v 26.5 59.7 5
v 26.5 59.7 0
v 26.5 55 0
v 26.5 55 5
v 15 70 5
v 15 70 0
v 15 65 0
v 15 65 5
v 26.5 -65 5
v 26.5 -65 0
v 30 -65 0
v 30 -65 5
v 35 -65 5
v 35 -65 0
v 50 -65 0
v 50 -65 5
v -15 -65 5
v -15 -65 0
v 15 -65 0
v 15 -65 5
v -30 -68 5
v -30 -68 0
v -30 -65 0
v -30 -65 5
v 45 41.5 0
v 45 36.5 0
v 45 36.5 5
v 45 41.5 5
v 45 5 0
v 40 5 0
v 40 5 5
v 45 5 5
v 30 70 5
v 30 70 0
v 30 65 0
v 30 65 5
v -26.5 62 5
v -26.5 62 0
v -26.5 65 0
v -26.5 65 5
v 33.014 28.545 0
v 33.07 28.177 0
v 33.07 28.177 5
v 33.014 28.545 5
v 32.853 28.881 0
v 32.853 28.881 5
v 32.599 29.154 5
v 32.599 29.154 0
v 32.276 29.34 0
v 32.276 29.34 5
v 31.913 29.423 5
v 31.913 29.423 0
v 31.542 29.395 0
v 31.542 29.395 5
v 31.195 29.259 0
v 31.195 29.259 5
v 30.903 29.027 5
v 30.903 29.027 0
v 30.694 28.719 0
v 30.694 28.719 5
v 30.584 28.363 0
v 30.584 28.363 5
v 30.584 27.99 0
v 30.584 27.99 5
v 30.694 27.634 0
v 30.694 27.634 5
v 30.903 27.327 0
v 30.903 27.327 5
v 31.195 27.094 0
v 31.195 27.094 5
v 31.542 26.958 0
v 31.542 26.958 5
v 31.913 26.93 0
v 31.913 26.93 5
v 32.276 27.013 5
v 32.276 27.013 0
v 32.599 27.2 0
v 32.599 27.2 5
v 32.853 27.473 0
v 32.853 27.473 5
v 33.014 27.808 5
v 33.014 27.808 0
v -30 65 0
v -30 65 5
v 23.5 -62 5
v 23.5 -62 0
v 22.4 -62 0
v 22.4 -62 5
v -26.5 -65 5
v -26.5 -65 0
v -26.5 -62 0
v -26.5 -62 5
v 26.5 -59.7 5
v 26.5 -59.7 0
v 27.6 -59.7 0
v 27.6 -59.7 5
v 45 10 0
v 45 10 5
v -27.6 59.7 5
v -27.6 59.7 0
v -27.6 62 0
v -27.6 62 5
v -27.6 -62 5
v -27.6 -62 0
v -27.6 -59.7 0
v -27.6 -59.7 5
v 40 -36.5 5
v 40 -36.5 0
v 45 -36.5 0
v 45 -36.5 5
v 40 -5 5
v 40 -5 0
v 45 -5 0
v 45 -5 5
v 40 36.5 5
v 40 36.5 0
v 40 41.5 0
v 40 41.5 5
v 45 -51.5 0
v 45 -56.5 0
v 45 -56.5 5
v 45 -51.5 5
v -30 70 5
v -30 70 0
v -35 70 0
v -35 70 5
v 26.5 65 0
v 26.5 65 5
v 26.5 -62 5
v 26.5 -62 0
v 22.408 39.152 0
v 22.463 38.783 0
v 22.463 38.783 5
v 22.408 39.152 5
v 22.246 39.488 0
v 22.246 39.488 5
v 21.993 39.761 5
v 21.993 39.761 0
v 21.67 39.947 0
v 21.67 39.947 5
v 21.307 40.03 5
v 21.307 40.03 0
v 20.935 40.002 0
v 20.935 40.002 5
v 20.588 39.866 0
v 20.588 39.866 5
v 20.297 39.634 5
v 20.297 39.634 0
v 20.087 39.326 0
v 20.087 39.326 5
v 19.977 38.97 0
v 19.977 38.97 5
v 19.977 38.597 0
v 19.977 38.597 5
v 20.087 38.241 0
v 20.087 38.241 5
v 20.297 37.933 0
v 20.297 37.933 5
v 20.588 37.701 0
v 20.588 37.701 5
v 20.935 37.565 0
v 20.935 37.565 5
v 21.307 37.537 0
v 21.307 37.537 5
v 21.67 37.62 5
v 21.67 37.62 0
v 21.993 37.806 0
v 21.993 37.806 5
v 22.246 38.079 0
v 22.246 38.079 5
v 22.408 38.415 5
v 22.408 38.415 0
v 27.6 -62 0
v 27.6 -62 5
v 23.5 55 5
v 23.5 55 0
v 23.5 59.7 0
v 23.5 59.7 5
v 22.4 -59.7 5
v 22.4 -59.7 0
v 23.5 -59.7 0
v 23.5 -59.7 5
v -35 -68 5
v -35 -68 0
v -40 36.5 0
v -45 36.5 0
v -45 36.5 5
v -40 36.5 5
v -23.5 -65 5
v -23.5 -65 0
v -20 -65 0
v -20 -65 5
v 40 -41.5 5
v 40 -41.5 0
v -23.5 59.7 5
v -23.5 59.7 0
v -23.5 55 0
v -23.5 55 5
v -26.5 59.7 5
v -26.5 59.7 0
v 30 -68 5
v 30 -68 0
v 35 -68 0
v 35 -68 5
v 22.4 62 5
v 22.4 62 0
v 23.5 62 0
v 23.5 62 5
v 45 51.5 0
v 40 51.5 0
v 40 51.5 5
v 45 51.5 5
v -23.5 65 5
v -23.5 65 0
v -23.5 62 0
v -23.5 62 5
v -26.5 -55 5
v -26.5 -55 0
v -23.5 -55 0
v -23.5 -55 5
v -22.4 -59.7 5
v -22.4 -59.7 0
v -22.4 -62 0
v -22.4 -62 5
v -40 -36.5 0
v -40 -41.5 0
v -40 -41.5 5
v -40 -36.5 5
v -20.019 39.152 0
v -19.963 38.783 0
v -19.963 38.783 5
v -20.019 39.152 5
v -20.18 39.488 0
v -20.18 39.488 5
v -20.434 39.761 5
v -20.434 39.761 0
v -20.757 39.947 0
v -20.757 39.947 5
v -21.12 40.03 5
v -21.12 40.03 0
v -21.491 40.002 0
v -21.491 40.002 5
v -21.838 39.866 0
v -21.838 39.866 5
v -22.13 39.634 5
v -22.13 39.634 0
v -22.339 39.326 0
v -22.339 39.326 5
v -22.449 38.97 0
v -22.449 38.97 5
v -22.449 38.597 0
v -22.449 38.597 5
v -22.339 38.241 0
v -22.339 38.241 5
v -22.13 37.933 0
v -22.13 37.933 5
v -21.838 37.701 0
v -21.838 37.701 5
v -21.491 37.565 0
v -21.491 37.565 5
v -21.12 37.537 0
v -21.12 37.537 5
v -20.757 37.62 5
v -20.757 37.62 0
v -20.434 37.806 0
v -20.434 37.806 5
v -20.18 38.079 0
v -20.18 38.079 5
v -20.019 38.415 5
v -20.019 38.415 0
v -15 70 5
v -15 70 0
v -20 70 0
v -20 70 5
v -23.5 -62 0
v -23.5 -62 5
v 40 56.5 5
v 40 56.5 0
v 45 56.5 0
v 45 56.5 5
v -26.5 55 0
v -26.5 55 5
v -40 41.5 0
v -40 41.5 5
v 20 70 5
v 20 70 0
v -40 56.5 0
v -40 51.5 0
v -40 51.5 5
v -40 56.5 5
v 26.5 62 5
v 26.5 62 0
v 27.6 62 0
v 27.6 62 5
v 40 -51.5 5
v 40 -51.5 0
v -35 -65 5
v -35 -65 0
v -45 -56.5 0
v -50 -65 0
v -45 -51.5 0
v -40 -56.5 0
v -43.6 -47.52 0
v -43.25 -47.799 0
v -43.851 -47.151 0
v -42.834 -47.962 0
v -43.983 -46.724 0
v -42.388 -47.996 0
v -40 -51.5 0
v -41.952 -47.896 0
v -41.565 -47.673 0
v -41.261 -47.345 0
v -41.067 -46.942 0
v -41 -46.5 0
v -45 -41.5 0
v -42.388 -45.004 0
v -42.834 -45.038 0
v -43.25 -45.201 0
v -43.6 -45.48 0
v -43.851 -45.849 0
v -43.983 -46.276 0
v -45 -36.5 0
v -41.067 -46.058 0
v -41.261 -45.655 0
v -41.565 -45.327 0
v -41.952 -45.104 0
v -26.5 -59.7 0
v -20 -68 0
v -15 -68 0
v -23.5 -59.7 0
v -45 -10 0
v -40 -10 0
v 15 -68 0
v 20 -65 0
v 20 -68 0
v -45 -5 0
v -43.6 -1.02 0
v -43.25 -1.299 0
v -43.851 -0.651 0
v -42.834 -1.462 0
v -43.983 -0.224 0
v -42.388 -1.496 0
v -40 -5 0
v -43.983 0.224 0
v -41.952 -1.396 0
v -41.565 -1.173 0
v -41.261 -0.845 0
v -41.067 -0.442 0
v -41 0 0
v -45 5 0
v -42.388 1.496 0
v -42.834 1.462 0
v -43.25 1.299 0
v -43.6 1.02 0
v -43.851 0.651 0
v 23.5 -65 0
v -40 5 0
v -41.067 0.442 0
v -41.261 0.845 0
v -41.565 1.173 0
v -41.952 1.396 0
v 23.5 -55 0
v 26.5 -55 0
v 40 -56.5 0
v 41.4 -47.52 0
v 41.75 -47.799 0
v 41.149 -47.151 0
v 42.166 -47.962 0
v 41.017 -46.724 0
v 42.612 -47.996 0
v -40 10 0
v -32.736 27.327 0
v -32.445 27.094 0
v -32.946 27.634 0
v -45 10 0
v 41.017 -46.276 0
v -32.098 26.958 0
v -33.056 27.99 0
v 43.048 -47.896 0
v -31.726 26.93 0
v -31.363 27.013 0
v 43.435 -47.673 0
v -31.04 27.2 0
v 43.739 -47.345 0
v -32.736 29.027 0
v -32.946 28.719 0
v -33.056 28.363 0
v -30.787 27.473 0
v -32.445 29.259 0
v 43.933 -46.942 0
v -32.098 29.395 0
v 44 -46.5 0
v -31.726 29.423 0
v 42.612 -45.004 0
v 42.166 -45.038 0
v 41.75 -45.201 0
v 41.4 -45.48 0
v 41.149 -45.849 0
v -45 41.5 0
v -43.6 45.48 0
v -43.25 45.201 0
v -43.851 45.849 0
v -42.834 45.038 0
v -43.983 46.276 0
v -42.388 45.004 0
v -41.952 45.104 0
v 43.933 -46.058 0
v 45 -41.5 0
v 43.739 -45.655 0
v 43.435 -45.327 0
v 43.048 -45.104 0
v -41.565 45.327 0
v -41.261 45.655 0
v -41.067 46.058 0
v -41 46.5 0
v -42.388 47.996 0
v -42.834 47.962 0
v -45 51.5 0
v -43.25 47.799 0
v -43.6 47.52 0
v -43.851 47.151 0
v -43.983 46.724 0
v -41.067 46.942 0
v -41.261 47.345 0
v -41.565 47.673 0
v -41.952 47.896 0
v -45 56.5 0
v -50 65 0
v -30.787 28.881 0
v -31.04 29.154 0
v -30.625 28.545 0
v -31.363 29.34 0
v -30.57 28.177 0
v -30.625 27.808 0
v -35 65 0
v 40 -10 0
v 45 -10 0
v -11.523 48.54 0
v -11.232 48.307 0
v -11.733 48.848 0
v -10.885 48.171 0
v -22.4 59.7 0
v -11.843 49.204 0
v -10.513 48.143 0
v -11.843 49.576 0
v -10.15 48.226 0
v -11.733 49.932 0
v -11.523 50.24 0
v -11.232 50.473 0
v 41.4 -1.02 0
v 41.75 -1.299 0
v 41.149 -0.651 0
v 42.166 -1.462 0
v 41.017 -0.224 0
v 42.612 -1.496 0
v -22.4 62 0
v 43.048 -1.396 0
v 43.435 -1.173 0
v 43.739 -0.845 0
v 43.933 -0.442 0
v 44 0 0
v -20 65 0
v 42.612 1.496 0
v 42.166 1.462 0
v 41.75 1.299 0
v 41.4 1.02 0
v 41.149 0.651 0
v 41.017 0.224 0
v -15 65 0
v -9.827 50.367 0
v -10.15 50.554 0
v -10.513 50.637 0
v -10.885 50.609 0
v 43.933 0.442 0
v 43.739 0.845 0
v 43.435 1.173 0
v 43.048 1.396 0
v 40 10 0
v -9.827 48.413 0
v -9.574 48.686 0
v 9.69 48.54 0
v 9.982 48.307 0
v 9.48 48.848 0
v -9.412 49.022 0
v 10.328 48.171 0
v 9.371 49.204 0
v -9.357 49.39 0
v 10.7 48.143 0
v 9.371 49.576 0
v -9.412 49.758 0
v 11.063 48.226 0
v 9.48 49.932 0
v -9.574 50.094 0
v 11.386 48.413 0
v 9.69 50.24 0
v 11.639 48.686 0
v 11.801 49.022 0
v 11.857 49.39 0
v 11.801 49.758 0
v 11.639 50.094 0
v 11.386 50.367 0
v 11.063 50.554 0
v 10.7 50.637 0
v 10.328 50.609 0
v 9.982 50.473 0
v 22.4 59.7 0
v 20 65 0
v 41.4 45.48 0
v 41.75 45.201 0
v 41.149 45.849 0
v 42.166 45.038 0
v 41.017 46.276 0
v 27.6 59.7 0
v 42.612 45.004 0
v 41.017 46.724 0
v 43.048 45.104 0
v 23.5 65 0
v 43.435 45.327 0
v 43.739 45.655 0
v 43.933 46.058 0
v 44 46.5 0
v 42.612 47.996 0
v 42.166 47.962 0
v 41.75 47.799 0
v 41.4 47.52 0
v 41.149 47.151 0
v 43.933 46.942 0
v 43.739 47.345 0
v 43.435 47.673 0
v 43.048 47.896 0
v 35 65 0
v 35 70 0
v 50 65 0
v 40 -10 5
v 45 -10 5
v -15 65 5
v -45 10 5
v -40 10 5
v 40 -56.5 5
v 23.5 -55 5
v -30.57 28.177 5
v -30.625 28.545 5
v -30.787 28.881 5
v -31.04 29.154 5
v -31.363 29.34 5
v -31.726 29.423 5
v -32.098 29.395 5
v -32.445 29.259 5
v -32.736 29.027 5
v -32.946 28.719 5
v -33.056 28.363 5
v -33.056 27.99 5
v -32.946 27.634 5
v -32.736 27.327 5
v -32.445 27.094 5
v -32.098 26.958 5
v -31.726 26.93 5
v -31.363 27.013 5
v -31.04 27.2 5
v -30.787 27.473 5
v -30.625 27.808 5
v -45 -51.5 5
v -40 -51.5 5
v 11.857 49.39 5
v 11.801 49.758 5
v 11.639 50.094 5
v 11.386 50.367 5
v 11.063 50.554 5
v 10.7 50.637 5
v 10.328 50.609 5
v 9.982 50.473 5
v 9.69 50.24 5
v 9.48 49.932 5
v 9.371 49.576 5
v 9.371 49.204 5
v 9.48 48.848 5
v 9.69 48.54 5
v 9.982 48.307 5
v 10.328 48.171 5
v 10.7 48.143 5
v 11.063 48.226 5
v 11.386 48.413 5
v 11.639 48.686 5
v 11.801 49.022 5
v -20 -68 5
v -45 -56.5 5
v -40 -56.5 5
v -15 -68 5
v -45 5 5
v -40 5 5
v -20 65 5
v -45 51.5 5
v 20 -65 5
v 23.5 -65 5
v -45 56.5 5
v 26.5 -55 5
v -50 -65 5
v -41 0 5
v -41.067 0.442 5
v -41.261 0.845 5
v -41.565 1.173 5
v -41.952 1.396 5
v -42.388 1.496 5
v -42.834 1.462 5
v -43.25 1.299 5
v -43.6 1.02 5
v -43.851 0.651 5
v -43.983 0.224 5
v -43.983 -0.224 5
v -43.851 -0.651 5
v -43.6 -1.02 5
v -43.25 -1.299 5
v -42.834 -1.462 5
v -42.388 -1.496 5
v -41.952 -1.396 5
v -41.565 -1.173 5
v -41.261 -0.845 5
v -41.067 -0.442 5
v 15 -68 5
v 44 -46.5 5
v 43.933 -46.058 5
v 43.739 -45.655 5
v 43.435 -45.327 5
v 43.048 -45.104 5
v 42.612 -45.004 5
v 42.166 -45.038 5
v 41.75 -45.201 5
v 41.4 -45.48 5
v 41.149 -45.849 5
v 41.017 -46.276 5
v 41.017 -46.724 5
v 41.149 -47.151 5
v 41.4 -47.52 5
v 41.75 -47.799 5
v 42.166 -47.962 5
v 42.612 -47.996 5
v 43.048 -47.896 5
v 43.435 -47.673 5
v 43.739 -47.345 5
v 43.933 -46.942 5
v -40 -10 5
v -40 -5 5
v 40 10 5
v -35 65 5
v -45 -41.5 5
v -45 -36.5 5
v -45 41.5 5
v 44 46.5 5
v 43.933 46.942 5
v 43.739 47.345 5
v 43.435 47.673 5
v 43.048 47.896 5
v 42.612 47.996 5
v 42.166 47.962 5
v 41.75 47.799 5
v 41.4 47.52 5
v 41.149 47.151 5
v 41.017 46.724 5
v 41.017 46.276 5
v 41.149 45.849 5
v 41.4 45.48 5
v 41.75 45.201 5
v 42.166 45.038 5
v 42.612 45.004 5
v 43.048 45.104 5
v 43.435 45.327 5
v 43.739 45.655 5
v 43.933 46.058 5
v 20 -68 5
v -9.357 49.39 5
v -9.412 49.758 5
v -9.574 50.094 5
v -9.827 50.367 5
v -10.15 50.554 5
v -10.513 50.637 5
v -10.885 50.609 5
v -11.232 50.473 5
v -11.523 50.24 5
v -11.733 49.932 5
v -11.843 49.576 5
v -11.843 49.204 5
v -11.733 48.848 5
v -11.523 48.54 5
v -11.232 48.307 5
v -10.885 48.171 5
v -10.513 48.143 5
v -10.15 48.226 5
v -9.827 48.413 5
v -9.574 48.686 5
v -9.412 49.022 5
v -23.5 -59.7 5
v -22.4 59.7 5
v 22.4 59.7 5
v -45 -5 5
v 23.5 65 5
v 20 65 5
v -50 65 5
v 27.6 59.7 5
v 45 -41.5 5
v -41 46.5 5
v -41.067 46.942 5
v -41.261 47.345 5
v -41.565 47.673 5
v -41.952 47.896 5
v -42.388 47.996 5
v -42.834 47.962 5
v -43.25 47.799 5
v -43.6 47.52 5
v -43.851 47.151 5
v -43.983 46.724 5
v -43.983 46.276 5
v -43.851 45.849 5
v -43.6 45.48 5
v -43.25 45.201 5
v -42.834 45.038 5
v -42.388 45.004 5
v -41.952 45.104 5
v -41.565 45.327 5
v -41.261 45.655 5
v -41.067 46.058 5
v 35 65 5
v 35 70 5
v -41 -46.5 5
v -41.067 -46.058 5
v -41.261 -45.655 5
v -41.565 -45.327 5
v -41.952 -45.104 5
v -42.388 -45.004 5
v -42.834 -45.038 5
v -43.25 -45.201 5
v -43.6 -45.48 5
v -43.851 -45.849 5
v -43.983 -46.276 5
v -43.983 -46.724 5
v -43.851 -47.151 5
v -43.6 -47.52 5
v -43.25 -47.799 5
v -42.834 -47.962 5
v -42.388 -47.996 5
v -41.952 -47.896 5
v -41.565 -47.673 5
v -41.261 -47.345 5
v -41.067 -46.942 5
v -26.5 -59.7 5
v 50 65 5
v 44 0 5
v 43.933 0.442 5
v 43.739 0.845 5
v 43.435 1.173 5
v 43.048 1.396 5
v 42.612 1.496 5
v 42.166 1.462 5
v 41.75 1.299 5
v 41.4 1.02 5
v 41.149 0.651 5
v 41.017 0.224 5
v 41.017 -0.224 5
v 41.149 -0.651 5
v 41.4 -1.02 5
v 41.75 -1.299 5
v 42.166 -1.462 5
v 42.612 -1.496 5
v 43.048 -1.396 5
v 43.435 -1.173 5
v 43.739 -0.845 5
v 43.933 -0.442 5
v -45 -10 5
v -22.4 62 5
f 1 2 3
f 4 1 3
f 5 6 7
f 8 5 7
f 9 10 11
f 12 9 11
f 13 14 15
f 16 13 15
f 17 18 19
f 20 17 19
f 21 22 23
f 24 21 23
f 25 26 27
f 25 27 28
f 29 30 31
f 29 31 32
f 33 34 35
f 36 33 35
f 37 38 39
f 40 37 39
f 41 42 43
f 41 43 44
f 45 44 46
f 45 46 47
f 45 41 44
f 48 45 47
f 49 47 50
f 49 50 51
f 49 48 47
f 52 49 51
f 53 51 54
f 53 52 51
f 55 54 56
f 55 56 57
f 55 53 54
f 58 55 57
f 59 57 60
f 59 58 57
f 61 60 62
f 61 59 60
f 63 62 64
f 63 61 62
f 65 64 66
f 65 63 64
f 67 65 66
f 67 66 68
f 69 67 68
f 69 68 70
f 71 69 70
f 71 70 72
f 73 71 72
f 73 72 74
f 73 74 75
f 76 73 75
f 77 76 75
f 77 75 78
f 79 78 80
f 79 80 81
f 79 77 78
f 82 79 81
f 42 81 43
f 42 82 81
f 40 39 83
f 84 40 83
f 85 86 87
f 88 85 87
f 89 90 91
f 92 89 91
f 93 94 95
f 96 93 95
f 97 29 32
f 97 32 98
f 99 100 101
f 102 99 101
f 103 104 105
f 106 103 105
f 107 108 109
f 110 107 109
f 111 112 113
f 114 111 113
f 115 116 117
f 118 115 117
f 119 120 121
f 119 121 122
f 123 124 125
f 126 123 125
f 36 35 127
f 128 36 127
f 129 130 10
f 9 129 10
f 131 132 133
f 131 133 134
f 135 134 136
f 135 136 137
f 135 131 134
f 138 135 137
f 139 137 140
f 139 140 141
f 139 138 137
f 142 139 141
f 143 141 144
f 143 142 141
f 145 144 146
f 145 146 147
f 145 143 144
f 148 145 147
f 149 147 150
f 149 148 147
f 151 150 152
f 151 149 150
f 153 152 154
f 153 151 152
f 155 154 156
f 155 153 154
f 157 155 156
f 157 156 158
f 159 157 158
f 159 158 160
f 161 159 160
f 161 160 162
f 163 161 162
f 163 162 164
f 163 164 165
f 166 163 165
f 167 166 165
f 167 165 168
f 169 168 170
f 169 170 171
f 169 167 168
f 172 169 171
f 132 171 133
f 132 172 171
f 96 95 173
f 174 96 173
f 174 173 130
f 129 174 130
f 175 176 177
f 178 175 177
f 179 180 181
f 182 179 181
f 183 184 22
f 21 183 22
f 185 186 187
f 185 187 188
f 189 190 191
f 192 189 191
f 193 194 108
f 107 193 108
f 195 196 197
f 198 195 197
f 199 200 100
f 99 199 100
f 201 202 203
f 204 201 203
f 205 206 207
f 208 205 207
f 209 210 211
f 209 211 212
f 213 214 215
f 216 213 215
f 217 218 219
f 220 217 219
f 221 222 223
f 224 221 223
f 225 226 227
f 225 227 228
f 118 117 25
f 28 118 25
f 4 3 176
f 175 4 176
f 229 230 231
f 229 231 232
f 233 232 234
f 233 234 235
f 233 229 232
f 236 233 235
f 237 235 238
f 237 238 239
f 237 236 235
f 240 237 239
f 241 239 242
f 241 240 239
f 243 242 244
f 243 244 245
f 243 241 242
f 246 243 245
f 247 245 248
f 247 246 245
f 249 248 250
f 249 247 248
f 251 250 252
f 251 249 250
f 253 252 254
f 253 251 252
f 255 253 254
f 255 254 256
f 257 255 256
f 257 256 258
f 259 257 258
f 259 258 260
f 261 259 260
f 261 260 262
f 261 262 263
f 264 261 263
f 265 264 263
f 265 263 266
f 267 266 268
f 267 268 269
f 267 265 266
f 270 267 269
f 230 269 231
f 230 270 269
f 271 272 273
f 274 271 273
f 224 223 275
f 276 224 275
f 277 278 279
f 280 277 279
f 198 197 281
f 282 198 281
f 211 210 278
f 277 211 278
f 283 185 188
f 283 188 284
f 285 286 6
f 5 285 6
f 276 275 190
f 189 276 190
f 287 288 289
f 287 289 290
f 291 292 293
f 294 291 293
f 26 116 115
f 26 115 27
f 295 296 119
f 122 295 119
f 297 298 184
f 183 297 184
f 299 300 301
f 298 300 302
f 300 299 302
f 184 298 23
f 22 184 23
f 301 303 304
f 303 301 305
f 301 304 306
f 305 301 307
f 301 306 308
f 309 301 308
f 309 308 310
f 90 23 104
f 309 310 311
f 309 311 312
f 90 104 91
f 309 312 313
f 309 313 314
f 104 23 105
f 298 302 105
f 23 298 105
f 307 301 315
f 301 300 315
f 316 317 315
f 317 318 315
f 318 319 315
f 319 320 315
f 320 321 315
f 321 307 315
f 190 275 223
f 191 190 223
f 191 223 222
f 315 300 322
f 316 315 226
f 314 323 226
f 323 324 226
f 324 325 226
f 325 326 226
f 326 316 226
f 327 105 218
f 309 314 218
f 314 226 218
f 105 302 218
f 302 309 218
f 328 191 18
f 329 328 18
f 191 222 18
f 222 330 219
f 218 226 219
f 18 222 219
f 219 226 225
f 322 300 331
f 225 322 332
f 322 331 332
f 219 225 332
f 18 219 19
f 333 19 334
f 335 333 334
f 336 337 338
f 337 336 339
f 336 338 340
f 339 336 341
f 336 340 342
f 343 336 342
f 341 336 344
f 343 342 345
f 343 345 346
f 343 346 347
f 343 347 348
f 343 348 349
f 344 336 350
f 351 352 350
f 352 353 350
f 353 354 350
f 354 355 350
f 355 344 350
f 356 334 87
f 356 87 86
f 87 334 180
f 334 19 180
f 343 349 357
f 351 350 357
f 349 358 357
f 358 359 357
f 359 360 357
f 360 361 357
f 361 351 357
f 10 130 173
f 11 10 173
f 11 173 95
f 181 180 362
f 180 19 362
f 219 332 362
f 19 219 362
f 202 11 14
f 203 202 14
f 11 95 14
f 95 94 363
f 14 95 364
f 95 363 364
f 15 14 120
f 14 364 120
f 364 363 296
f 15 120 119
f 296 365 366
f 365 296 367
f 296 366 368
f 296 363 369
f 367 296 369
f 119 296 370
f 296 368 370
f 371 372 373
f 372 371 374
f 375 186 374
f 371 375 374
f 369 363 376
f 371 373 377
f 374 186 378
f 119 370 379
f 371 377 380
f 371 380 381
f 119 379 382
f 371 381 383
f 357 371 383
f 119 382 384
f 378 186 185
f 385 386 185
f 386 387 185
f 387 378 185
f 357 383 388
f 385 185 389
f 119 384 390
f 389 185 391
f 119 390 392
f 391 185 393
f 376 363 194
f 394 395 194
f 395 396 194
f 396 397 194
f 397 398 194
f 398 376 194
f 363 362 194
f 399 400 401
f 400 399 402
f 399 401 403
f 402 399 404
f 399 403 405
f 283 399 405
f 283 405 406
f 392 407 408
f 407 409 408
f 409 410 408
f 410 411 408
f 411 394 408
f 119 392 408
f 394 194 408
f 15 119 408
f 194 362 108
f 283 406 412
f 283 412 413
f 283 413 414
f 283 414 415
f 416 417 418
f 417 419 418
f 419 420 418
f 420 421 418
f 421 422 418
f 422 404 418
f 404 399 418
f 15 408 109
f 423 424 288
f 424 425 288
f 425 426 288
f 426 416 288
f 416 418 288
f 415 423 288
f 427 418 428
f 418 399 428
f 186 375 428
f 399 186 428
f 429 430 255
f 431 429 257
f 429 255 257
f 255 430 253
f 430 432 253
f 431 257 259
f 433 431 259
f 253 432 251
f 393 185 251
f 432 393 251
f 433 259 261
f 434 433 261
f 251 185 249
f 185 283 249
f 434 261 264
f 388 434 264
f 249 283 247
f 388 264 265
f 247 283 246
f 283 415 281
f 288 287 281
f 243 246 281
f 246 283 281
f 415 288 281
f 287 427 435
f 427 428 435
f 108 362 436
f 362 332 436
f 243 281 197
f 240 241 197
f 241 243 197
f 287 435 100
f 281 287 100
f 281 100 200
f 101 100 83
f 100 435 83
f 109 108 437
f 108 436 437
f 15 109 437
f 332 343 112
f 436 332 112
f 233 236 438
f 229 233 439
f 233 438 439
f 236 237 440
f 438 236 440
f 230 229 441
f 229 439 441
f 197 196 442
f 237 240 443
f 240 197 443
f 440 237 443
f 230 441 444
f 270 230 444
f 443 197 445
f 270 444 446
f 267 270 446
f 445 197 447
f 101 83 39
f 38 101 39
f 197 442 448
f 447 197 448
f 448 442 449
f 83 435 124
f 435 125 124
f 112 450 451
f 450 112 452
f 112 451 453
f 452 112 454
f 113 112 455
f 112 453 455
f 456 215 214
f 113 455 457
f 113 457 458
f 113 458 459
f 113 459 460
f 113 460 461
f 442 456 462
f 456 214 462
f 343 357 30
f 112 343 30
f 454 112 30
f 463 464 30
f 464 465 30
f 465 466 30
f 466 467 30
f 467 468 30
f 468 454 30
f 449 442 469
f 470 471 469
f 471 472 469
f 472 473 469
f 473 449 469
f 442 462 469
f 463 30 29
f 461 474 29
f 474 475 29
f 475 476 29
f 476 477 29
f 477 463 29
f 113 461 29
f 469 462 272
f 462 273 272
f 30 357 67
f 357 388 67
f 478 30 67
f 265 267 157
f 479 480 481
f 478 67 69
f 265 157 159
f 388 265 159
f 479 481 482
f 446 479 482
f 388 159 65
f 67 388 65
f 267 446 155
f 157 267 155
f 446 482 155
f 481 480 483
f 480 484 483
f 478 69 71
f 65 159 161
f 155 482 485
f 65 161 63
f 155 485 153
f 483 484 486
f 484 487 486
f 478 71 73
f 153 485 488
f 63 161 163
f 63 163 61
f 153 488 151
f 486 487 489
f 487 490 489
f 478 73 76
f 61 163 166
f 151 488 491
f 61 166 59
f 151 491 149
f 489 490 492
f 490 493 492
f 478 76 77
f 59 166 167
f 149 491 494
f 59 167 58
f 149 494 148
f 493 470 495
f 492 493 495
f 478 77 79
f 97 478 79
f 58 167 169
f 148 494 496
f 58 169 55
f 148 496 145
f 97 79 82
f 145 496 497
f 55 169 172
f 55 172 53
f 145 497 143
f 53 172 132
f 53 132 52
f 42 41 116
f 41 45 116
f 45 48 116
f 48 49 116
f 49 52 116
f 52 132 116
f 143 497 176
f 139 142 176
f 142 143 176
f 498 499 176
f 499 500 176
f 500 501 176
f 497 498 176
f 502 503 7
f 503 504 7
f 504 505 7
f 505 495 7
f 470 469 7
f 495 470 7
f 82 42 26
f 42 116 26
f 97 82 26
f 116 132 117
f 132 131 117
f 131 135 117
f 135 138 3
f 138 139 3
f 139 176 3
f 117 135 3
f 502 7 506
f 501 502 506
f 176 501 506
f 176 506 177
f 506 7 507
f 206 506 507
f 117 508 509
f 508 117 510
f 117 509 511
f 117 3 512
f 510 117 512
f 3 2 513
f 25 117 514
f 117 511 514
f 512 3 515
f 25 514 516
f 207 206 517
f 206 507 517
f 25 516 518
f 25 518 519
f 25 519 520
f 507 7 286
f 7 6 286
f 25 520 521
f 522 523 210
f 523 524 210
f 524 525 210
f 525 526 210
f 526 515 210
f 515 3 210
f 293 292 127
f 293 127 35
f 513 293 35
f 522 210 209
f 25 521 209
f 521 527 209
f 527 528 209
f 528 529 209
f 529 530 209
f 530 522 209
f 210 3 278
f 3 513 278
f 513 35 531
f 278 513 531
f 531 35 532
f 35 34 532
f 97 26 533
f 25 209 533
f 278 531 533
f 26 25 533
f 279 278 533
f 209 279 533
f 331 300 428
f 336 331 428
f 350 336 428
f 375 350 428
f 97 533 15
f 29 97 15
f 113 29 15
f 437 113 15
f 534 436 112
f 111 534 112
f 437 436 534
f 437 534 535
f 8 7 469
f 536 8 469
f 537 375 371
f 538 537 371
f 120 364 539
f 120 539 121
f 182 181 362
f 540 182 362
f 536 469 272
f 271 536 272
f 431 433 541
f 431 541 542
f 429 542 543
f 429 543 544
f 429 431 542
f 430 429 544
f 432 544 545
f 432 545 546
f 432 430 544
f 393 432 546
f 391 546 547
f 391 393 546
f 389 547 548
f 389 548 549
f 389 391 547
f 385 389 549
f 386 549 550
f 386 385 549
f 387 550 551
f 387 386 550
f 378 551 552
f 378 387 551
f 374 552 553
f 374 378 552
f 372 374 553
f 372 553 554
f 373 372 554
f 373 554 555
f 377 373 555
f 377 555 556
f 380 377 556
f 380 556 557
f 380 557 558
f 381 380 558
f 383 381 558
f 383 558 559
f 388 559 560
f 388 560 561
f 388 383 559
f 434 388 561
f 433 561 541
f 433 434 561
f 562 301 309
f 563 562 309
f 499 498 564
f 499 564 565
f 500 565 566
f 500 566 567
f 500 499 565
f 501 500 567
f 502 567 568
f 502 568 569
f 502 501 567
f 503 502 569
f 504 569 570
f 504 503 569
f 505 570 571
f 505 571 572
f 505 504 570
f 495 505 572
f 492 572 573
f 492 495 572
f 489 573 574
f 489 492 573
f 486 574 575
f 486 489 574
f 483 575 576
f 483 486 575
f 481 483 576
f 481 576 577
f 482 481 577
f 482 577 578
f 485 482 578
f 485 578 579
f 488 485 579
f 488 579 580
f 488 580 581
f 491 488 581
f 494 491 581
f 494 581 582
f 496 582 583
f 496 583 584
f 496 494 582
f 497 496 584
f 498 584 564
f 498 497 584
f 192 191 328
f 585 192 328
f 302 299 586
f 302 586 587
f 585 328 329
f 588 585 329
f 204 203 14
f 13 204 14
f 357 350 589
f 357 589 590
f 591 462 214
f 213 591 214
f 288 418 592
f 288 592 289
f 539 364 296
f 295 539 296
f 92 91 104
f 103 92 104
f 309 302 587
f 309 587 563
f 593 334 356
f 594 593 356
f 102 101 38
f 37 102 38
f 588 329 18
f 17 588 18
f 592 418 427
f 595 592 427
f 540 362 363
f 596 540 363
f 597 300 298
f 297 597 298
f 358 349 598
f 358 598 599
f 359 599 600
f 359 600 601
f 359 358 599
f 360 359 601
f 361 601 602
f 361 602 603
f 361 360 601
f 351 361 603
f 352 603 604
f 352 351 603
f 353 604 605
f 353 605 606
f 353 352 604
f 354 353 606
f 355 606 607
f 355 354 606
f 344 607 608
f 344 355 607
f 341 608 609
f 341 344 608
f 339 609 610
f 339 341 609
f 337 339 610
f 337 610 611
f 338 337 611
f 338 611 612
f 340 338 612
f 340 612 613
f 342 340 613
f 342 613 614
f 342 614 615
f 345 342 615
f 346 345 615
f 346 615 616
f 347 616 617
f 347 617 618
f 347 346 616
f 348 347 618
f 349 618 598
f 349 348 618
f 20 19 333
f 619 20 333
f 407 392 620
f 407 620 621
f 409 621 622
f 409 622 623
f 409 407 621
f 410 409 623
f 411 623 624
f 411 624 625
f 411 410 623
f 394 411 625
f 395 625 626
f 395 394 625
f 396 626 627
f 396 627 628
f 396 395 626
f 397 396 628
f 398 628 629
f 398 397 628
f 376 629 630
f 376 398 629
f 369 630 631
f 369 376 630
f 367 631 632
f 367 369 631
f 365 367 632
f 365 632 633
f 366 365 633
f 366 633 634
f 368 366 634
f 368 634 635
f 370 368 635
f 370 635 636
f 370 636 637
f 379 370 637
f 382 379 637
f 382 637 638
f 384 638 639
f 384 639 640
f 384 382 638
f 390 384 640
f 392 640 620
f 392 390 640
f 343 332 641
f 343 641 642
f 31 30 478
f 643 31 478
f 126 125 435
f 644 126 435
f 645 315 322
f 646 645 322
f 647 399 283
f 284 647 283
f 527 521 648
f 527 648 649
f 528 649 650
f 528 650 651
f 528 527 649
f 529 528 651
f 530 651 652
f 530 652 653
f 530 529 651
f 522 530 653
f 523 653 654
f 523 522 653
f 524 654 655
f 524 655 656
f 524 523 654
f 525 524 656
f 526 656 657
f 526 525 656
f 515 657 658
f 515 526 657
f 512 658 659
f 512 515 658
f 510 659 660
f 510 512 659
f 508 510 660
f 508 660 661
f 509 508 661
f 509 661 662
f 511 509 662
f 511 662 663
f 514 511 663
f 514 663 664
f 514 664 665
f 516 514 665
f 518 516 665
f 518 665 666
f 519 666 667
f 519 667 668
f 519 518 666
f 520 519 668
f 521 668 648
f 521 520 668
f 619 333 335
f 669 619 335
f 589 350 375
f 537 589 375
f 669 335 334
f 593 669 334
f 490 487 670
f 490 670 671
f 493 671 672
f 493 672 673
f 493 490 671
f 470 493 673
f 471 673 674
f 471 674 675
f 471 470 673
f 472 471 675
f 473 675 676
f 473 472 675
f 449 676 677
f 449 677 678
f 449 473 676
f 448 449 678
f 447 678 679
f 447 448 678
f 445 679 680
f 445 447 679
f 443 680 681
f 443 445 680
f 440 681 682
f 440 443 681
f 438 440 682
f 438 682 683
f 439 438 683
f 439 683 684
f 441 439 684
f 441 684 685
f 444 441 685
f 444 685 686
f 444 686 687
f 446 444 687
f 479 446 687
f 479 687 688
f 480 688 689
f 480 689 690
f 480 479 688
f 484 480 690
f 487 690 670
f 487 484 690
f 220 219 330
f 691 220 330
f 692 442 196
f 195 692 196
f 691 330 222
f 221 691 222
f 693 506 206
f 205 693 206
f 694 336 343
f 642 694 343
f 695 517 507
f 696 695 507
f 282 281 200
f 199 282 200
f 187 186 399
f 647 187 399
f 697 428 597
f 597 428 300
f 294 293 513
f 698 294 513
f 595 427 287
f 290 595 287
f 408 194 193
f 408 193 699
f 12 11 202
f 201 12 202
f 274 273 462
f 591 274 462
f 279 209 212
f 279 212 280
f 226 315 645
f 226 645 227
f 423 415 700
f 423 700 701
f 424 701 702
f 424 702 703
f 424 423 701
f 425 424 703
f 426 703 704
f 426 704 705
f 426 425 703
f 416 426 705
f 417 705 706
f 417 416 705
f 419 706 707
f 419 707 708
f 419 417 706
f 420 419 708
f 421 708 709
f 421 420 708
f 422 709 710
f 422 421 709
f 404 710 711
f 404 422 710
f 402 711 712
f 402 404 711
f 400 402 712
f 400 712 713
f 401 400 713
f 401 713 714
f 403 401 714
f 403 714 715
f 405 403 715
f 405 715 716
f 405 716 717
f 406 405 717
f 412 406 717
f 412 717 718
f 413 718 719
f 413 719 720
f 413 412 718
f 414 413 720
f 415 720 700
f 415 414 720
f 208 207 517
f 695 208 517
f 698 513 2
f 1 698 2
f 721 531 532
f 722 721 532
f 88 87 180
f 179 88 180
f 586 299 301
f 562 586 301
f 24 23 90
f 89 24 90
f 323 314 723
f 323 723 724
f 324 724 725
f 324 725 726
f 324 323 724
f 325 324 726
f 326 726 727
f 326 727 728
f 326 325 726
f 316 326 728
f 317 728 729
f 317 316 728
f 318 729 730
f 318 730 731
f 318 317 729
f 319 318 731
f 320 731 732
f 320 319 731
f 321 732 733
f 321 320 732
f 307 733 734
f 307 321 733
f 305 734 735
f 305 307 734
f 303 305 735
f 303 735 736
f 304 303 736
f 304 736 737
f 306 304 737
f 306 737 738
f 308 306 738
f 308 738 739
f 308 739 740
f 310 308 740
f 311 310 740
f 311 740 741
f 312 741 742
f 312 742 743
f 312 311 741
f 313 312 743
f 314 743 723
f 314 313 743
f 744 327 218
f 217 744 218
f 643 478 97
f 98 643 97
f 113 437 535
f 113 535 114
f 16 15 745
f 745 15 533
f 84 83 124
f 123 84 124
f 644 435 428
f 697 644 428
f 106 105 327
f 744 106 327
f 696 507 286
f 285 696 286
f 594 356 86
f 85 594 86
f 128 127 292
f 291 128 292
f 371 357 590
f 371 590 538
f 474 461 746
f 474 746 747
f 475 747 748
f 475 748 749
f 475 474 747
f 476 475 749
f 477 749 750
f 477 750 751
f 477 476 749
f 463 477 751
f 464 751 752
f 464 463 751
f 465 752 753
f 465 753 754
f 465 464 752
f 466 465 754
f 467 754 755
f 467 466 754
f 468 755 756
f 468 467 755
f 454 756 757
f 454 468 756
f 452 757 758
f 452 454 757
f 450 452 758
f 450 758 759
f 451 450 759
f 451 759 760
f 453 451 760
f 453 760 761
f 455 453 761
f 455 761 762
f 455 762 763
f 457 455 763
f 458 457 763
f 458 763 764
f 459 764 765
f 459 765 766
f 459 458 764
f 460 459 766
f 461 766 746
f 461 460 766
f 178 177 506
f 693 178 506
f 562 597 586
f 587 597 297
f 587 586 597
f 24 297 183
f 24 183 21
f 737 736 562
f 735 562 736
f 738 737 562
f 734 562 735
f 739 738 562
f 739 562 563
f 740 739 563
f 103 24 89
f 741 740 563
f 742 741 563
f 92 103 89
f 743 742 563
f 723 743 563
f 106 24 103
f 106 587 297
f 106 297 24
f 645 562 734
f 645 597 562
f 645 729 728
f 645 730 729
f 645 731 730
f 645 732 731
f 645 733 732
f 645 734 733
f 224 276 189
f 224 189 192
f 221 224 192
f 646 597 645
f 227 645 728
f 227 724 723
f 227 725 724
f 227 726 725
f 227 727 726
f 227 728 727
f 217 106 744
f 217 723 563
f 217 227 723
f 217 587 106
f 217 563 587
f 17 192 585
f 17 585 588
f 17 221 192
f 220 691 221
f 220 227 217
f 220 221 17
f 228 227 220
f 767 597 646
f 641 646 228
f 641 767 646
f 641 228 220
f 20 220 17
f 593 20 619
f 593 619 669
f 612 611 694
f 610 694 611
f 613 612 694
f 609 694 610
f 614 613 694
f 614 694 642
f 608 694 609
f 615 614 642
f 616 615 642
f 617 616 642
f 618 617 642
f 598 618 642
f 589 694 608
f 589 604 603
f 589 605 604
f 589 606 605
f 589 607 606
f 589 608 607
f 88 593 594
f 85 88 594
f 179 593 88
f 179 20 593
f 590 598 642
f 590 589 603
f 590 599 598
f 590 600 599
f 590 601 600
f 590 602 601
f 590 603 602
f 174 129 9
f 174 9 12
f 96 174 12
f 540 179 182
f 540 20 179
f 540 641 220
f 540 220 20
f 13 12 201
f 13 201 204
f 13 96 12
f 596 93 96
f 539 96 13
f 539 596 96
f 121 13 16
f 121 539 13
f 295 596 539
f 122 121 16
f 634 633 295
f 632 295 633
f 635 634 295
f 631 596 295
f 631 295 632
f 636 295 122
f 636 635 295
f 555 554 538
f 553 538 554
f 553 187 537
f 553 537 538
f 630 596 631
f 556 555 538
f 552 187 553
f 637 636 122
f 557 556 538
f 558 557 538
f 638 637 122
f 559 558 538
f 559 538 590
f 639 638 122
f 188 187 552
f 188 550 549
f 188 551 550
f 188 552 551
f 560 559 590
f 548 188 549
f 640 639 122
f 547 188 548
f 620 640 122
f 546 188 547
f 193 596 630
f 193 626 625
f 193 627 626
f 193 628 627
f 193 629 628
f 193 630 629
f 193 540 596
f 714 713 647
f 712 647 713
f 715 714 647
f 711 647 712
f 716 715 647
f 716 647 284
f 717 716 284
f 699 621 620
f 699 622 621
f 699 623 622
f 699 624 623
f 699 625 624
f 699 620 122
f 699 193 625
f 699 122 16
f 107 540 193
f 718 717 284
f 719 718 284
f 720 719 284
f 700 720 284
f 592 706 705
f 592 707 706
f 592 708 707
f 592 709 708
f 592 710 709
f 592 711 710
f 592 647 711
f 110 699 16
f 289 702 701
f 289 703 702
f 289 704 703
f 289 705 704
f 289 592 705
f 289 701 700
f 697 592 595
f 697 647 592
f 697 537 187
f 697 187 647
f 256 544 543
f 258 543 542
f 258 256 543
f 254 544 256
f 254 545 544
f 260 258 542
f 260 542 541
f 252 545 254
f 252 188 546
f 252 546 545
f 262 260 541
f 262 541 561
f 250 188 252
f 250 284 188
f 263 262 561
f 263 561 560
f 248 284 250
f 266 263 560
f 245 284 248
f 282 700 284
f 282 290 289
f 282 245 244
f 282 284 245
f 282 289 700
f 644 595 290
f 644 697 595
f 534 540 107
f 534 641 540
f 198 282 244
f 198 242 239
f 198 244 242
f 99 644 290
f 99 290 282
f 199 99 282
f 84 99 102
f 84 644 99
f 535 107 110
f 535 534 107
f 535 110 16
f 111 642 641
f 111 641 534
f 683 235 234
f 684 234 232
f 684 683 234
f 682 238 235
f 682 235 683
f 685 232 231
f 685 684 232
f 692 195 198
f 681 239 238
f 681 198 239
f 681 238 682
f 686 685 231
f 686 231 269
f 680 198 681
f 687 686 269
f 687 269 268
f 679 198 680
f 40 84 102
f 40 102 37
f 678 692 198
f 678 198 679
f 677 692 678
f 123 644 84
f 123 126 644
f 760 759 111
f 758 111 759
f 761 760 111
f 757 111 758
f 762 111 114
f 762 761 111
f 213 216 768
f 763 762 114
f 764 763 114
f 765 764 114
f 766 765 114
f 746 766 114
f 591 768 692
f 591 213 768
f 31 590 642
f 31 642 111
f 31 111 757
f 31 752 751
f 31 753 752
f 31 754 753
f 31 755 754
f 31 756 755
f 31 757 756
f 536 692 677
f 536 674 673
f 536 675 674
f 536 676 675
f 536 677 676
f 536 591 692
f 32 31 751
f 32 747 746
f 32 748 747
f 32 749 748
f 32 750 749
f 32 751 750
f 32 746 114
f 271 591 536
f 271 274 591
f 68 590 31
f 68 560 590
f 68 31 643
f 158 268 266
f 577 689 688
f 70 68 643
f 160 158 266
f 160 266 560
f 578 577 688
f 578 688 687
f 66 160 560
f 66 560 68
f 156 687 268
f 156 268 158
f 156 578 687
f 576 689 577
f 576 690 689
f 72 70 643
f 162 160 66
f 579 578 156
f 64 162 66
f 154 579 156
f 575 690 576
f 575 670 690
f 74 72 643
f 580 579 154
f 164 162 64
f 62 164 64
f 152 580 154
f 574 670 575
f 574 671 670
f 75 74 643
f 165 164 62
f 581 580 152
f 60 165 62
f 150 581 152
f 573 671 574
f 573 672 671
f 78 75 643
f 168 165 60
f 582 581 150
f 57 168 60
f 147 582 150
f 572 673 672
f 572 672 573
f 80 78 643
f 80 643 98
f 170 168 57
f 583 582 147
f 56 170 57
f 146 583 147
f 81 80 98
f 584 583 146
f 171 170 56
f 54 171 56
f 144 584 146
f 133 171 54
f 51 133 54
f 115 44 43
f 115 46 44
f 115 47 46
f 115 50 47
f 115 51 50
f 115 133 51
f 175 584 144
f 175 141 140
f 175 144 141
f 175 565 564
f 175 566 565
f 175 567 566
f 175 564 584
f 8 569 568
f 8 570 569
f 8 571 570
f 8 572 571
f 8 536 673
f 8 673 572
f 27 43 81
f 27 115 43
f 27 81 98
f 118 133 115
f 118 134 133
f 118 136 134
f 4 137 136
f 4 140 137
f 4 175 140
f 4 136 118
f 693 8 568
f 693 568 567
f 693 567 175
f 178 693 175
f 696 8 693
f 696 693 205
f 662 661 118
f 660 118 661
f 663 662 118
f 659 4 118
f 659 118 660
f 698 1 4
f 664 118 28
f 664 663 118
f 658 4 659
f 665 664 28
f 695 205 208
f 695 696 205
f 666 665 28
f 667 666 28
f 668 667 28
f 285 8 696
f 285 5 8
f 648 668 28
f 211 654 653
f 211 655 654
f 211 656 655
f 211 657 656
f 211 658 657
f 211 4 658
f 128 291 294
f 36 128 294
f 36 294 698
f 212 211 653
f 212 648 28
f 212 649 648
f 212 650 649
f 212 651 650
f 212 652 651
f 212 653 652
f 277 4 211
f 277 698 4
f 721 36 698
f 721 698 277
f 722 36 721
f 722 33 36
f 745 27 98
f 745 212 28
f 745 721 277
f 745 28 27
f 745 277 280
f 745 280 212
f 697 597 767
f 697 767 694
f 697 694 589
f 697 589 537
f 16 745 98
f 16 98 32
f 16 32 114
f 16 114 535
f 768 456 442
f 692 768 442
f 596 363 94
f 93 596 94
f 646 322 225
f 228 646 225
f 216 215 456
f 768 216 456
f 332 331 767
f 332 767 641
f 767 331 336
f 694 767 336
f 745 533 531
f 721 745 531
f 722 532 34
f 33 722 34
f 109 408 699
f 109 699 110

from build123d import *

# Parameters (mm, degrees)
SKETCH1_W           = 5
SKETCH1_H           = 5
SKETCH1_R           = 1.5
SKETCH1_R_2         = 1.25
BOSS_EXTRUDE1_DEPTH = 5


with BuildPart() as part:
    # Sketch1 → Boss-Extrude1 (new body)
    with BuildSketch(Plane.XY):
        Polygon((-50, 65), (-50, -65), (-35, -65), (-35, -68), (-30, -68), (-30, -65), (-26.5, -65), (-26.5, -62), (-27.6, -62), (-27.6, -59.7), (-26.5, -59.7), (-26.5, -55), (-23.5, -55), (-23.5, -59.7), (-22.4, -59.7), (-22.4, -62), (-23.5, -62), (-23.5, -65), (-20, -65), (-20, -68), (-15, -68), (-15, -65), (15, -65), (15, -68), (20, -68), (20, -65), (23.5, -65), (23.5, -62), (22.4, -62), (22.4, -59.7), (23.5, -59.7), (23.5, -55), (26.5, -55), (26.5, -59.7), (27.6, -59.7), (27.6, -62), (26.5, -62), (26.5, -65), (30, -65), (30, -68), (35, -68), (35, -65), (50, -65), (50, 65), (35, 65), (35, 70), (30, 70), (30, 65), (26.5, 65), (26.5, 62), (27.6, 62), (27.6, 59.7), (26.5, 59.7), (26.5, 55), (23.5, 55), (23.5, 59.7), (22.4, 59.7), (22.4, 62), (23.5, 62), (23.5, 65), (20, 65), (20, 70), (15, 70), (15, 65), (-15, 65), (-15, 70), (-20, 70), (-20, 65), (-23.5, 65), (-23.5, 62), (-22.4, 62), (-22.4, 59.7), (-23.5, 59.7), (-23.5, 55), (-26.5, 55), (-26.5, 59.7), (-27.6, 59.7), (-27.6, 62), (-26.5, 62), (-26.5, 65), (-30, 65), (-30, 70), (-35, 70), (-35, 65), align=None)
        with Locations((-42.5, -54)):
            Rectangle(SKETCH1_W, SKETCH1_H, mode=Mode.SUBTRACT)
        with Locations((-42.5, -46.5)):
            Circle(SKETCH1_R, mode=Mode.SUBTRACT)
        with Locations((-42.5, -39)):
            Rectangle(SKETCH1_W, SKETCH1_H, mode=Mode.SUBTRACT)
        with Locations((-42.5, -7.5)):
            Rectangle(SKETCH1_W, SKETCH1_H, mode=Mode.SUBTRACT)
        with Locations((-42.5, 0)):
            Circle(SKETCH1_R, mode=Mode.SUBTRACT)
        with Locations((42.5, -54)):
            Rectangle(SKETCH1_W, SKETCH1_H, mode=Mode.SUBTRACT)
        with Locations((42.5, -46.5)):
            Circle(SKETCH1_R, mode=Mode.SUBTRACT)
        with Locations((42.5, -39)):
            Rectangle(SKETCH1_W, SKETCH1_H, mode=Mode.SUBTRACT)
        with Locations((42.5, -7.5)):
            Rectangle(SKETCH1_W, SKETCH1_H, mode=Mode.SUBTRACT)
        with Locations((42.5, 0)):
            Circle(SKETCH1_R, mode=Mode.SUBTRACT)
        with Locations((-42.5, 7.5)):
            Rectangle(SKETCH1_W, SKETCH1_H, mode=Mode.SUBTRACT)
        with Locations((-31.819805153, 28.176796564)):
            Circle(SKETCH1_R_2, mode=Mode.SUBTRACT)
        with Locations((-42.5, 39)):
            Rectangle(SKETCH1_W, SKETCH1_H, mode=Mode.SUBTRACT)
        with Locations((-42.5, 46.5)):
            Circle(SKETCH1_R, mode=Mode.SUBTRACT)
        with Locations((-42.5, 54)):
            Rectangle(SKETCH1_W, SKETCH1_H, mode=Mode.SUBTRACT)
        with Locations((-21.213203436, 38.783398282)):
            Circle(SKETCH1_R_2, mode=Mode.SUBTRACT)
        with Locations((-10.606601718, 49.39)):
            Circle(SKETCH1_R_2, mode=Mode.SUBTRACT)
        with Locations((42.5, 7.5)):
            Rectangle(SKETCH1_W, SKETCH1_H, mode=Mode.SUBTRACT)
        with Locations((31.819805153, 28.176796564)):
            Circle(SKETCH1_R_2, mode=Mode.SUBTRACT)
        with Locations((10.606601718, 49.39)):
            Circle(SKETCH1_R_2, mode=Mode.SUBTRACT)
        with Locations((21.213203436, 38.783398282)):
            Circle(SKETCH1_R_2, mode=Mode.SUBTRACT)
        with Locations((42.5, 39)):
            Rectangle(SKETCH1_W, SKETCH1_H, mode=Mode.SUBTRACT)
        with Locations((42.5, 46.5)):
            Circle(SKETCH1_R, mode=Mode.SUBTRACT)
        with Locations((42.5, 54)):
            Rectangle(SKETCH1_W, SKETCH1_H, mode=Mode.SUBTRACT)
    extrude(amount=BOSS_EXTRUDE1_DEPTH)


solid = part.part
